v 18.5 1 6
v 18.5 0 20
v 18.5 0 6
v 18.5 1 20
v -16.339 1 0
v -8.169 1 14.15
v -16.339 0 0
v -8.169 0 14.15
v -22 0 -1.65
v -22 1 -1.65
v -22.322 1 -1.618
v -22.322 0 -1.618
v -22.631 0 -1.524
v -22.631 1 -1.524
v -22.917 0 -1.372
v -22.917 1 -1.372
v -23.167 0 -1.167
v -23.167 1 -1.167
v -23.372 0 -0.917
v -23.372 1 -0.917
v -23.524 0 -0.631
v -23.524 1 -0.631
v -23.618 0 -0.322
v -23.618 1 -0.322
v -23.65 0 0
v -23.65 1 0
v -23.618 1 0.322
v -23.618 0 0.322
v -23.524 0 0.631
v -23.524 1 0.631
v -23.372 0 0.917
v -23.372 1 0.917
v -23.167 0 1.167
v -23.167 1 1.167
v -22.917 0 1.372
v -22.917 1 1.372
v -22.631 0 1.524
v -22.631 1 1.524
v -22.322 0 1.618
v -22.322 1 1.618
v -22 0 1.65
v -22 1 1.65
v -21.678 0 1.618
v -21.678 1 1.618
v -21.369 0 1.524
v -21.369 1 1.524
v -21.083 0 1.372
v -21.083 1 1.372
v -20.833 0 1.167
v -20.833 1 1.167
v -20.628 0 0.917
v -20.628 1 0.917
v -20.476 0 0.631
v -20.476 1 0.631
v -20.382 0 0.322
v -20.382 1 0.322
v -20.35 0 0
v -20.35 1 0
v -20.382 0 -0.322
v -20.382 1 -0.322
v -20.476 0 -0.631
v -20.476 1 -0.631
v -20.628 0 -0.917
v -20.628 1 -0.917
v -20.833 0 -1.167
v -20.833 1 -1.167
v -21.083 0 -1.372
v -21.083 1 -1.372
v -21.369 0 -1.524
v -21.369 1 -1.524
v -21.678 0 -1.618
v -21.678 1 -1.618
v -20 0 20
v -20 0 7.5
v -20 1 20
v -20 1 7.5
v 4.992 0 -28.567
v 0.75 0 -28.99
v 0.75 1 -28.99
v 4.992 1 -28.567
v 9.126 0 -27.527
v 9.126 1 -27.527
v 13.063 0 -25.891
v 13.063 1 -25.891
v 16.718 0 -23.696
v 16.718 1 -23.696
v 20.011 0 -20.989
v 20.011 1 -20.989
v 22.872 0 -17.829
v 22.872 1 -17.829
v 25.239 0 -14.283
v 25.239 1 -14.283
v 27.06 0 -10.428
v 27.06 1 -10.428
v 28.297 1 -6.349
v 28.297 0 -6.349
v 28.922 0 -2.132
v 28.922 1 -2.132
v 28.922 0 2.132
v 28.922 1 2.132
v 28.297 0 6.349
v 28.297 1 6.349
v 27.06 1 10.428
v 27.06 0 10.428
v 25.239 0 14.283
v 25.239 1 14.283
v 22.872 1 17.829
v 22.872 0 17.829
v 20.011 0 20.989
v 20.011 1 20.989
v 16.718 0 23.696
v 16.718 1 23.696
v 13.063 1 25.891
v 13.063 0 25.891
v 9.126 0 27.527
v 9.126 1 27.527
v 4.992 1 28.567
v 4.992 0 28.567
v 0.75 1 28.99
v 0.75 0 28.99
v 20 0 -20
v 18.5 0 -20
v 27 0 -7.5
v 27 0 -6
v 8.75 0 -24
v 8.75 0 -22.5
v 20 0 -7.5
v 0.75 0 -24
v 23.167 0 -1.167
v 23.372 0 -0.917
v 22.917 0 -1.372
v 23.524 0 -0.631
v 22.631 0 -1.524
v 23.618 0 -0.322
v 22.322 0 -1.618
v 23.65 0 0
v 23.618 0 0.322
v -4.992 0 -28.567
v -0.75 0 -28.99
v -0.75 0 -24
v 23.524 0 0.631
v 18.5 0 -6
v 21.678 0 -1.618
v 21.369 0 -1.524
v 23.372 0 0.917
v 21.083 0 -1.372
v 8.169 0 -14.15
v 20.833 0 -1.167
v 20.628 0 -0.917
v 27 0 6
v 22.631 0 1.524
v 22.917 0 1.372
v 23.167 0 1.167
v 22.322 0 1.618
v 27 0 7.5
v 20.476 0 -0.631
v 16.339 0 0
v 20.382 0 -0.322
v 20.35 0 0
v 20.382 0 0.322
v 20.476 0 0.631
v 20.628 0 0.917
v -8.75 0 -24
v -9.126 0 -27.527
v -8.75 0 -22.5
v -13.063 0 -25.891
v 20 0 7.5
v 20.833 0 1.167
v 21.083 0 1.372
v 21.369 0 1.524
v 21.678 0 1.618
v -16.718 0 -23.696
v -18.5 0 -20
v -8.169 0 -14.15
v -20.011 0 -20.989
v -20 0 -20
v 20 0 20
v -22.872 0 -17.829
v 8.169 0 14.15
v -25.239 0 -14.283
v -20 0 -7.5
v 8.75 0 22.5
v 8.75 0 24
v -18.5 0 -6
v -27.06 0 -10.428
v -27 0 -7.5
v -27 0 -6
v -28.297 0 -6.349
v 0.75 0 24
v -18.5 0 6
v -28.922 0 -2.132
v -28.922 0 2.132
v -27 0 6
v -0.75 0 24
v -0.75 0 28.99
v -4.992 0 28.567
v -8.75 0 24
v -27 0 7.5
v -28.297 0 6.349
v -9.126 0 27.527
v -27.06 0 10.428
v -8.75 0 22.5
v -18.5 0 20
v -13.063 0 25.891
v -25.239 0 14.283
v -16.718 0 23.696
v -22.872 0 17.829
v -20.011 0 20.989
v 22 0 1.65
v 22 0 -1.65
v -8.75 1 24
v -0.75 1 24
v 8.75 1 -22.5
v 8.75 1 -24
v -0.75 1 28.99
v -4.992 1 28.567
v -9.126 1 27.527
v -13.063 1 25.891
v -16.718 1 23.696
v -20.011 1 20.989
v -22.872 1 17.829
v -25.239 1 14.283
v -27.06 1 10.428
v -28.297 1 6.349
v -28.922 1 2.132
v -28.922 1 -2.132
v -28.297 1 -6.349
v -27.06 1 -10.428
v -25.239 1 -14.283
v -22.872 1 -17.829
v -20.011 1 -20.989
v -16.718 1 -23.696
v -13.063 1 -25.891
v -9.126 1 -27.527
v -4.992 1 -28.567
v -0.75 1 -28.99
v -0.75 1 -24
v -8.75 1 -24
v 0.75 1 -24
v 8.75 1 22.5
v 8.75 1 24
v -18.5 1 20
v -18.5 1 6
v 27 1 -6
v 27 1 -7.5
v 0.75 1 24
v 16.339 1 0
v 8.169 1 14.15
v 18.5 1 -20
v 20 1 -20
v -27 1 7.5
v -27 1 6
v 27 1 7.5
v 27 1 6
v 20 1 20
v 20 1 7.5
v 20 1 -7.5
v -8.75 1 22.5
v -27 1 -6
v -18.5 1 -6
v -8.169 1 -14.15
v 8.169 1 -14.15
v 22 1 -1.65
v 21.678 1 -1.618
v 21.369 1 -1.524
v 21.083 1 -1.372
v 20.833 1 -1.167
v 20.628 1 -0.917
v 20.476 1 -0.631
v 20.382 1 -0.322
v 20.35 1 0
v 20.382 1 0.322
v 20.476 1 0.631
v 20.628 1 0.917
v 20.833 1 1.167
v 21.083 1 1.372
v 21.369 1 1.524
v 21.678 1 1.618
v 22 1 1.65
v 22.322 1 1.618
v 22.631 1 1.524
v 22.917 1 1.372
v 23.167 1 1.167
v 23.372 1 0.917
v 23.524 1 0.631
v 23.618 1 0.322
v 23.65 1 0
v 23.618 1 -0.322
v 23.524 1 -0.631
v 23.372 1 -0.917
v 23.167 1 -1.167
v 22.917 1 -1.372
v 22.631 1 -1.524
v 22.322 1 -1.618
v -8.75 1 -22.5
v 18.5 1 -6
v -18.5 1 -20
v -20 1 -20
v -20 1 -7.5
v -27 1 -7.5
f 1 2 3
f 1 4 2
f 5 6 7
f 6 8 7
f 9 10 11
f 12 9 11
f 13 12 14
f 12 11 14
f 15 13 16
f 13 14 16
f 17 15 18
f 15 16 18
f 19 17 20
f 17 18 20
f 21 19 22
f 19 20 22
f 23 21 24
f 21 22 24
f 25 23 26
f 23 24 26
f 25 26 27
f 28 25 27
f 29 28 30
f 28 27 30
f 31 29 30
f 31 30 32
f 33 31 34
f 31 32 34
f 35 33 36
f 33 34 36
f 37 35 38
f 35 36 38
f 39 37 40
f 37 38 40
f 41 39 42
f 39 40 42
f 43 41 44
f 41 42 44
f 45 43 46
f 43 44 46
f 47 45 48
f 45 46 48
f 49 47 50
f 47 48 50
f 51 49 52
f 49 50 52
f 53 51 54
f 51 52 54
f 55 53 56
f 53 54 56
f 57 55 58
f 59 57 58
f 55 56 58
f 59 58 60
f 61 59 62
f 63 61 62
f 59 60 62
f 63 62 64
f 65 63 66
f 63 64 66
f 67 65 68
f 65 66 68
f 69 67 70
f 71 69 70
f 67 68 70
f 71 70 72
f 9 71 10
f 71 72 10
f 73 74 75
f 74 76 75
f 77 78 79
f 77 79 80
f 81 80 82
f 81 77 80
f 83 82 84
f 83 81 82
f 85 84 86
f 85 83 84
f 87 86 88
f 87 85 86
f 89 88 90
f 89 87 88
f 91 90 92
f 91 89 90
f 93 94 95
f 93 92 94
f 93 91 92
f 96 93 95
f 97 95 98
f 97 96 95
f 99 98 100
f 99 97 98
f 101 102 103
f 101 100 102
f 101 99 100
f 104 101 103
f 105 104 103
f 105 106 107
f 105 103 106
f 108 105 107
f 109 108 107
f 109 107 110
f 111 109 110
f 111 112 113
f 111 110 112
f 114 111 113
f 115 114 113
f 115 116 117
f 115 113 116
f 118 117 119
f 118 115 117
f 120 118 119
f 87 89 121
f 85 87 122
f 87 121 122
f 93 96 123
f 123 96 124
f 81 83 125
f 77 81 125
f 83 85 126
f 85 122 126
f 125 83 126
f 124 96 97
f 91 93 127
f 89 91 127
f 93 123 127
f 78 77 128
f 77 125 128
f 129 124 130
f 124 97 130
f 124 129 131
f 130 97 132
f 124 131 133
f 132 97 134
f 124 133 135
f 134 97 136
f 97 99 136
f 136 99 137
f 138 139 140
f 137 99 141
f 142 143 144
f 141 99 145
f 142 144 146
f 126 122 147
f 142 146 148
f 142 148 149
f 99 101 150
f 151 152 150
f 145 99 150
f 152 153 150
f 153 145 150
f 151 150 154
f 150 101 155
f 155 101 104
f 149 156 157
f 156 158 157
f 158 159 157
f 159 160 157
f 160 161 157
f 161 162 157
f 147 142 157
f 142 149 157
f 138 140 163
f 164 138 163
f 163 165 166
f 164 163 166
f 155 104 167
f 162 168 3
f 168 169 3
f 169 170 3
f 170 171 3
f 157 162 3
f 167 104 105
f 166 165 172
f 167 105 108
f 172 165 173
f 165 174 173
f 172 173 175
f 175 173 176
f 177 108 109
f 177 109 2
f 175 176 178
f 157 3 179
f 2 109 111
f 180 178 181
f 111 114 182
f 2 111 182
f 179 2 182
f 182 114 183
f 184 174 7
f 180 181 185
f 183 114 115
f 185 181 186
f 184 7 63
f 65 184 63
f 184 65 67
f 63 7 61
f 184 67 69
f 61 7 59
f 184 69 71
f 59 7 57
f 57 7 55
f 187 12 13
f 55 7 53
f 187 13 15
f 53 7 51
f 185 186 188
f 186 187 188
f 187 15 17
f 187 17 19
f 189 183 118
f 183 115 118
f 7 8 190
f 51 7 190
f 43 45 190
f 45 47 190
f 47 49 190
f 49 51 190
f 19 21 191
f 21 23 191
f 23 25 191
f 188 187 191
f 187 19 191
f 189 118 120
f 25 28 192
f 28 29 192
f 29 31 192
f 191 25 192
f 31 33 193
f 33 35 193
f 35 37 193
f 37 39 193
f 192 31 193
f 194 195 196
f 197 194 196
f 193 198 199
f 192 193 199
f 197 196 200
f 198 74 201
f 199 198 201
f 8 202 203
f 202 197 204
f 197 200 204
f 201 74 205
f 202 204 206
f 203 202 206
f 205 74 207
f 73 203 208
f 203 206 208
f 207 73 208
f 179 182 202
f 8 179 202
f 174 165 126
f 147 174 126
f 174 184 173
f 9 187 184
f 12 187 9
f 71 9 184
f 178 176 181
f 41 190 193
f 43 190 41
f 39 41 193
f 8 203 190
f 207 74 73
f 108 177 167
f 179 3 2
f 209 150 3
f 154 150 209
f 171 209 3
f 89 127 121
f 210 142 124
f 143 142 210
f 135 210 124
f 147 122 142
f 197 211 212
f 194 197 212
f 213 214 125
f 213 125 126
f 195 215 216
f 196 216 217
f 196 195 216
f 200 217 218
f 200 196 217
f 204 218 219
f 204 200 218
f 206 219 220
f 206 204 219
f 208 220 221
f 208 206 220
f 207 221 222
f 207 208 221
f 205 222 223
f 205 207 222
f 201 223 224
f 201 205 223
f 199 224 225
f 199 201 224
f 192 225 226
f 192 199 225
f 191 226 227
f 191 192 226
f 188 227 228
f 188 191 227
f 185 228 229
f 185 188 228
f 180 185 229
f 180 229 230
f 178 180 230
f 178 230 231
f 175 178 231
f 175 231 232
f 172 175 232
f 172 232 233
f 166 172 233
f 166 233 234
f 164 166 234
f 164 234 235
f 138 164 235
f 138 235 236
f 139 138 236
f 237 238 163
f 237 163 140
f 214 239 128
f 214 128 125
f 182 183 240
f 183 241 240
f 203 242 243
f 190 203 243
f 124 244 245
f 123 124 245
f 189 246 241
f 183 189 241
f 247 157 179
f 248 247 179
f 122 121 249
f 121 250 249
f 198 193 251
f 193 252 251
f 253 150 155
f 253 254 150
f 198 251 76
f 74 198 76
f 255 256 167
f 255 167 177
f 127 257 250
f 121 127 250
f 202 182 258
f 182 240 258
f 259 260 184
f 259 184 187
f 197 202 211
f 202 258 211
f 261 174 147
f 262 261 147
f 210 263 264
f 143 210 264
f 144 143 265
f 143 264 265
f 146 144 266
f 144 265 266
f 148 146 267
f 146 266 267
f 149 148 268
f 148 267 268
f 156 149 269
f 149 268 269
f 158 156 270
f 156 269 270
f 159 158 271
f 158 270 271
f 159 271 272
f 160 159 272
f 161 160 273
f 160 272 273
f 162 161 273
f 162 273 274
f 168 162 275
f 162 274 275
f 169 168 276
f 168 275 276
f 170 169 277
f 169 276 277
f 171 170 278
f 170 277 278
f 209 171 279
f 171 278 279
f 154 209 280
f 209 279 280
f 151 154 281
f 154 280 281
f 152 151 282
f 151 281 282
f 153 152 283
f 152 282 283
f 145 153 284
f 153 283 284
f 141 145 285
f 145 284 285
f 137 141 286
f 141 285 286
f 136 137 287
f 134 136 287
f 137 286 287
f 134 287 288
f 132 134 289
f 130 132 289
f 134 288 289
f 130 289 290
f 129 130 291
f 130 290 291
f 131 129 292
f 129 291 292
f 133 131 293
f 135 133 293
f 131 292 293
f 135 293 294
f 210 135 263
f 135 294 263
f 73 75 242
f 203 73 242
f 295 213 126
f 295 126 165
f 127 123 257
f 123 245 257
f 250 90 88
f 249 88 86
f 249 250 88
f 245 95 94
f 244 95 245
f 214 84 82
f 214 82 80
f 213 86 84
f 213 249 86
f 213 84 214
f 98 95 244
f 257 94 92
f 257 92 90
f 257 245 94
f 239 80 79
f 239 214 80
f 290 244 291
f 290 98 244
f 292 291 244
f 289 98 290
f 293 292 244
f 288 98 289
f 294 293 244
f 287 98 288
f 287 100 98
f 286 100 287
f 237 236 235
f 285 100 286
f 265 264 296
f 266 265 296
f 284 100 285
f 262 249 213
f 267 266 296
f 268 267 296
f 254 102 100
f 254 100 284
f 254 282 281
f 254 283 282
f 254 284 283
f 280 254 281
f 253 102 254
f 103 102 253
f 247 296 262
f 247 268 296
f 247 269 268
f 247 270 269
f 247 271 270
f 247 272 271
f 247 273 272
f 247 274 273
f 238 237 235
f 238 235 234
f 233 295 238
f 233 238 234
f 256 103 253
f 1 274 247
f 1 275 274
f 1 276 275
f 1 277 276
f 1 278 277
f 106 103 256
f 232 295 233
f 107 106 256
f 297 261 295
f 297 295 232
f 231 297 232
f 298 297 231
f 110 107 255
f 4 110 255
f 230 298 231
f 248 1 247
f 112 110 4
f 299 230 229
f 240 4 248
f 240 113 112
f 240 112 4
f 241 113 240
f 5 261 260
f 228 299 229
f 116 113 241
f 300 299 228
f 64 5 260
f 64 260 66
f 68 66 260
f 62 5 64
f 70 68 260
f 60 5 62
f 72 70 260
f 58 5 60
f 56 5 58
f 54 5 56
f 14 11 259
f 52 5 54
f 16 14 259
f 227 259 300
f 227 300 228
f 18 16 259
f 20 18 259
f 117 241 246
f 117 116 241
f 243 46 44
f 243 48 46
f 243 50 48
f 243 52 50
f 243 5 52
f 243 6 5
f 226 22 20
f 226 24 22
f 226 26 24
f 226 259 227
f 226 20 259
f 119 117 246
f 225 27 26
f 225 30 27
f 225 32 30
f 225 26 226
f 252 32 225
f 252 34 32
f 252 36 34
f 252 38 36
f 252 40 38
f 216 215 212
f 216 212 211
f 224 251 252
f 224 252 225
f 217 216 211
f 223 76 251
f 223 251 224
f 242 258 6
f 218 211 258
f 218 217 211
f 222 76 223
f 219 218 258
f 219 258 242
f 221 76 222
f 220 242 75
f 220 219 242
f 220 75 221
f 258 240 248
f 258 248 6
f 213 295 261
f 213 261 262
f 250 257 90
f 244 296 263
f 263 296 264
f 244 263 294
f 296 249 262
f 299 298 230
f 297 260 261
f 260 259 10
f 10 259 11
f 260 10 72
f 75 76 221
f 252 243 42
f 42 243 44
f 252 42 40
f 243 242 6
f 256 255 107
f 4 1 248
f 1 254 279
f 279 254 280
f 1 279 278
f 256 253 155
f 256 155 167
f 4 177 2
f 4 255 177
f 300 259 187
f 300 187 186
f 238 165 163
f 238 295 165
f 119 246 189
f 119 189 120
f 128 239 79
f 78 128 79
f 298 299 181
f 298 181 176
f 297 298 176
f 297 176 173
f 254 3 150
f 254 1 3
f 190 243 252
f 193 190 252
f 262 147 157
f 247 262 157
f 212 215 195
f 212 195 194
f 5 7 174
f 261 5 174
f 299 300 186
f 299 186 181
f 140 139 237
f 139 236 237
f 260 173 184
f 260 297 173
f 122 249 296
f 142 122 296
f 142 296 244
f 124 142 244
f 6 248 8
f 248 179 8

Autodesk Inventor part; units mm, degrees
ref_plane "YZ Plane" through (0, 0, 0) normal (1, 0, 0) x (0, 1, 0)
ref_plane "XZ Plane" through (0, 0, 0) normal (0, 1, 0) x (-1, 0, 0)
ref_plane "XY Plane" through (0, 0, 0) normal (0, 0, 1) x (1, 0, 0)
sketch "Sketch1" plane through (0, 0, 0) normal (0, 1, 0) x (-1, 0, 0)
  circle A0 centre (0, 0) radius 29
  line L0 (-8.1695, -14.15) -> (-16.339, 0)
  line L1 (-16.339, 0) -> (-8.1695, 14.15)
  line L2 (-8.1695, 14.15) -> (8.1695, 14.15)
  line L3 (8.1695, 14.15) -> (16.339, 0)
  line L4 (16.339, 0) -> (8.1695, -14.15)
  line L5 (8.1695, -14.15) -> (-8.1695, -14.15)
  dimension "d0" = 58
  dimension "d1" = 28.3
extrude "Plate1" add sketch "Sketch1" along normal blind 1
sketch "Sketch2" plane through (0, 0, 0) normal (0, 1, 0) x (-1, 0, 0)
  point P0 (0, 0)
  point P1 (22, 0)
  point P2 (-22, 0)
  dimension "d3" = 22
  dimension "d4" = 22
hole "Hole1" at (-22, 0, 0) at (22, 0, 0) direction (0, 1, 0) diameter 3.3 end through all
sketch "Sketch3" plane through (0, 1, 0) normal (0, 1, 0) x (1, 0, 0)
  line L0 (0, 0) -> (8.5176, 0)
  line L1 (0, 0) -> (0, 7.5276)
  line L2 (-8.75, 24) -> (8.75, 24)
  line L3 (8.75, 24) -> (8.75, 22.5)
  line L4 (8.75, 22.5) -> (-8.75, 22.5)
  line L5 (-8.75, 22.5) -> (-8.75, 24)
  line L6 (0.75, 42.5) -> (-0.75, 42.5)
  line L7 (-0.75, 42.5) -> (-0.75, 22.5)
  line L8 (-0.75, 22.5) -> (0.75, 22.5)
  line L9 (0.75, 22.5) -> (0.75, 42.5)
  line L10 (-8.75, -24) -> (8.75, -24)
  line L11 (8.75, -24) -> (8.75, -22.5)
  line L12 (8.75, -22.5) -> (-8.75, -22.5)
  line L13 (-8.75, -22.5) -> (-8.75, -24)
  line L14 (0.75, -42.5) -> (-0.75, -42.5)
  line L15 (-0.75, -42.5) -> (-0.75, -22.5)
  line L16 (-0.75, -22.5) -> (0.75, -22.5)
  line L17 (0.75, -22.5) -> (0.75, -42.5)
  line L18 (-27, 7.5) -> (-18.5, 7.5)
  line L19 (-18.5, 7.5) -> (-18.5, 6)
  line L20 (-18.5, 6) -> (-27, 6)
  line L21 (-27, 6) -> (-27, 7.5)
  line L22 (-18.5, 6) -> (-20, 6)
  line L23 (-20, 6) -> (-20, 20)
  line L24 (-20, 20) -> (-18.5, 20)
  line L25 (-18.5, 20) -> (-18.5, 6)
  line L26 (27, 7.5) -> (18.5, 7.5)
  line L27 (18.5, 7.5) -> (18.5, 6)
  line L28 (18.5, 6) -> (27, 6)
  line L29 (27, 6) -> (27, 7.5)
  line L30 (18.5, 6) -> (20, 6)
  line L31 (20, 6) -> (20, 20)
  line L32 (20, 20) -> (18.5, 20)
  line L33 (18.5, 20) -> (18.5, 6)
  line L34 (-27, -7.5) -> (-18.5, -7.5)
  line L35 (-18.5, -7.5) -> (-18.5, -6)
  line L36 (-18.5, -6) -> (-27, -6)
  line L37 (-27, -6) -> (-27, -7.5)
  line L38 (-18.5, -6) -> (-20, -6)
  line L39 (-20, -6) -> (-20, -20)
  line L40 (-20, -20) -> (-18.5, -20)
  line L41 (-18.5, -20) -> (-18.5, -6)
  line L42 (18.5, -20) -> (18.5, -6)
  line L43 (20, -6) -> (20, -20)
  line L44 (20, -20) -> (18.5, -20)
  line L45 (18.5, -7.5) -> (18.5, -6)
  line L46 (18.5, -6) -> (20, -6)
  line L47 (27, -6) -> (27, -7.5)
  line L48 (27, -7.5) -> (18.5, -7.5)
  line L49 (18.5, -6) -> (27, -6)
  point P0 (0, 22.5)
  point P1 (0, -22.5)
  dimension "d12" = 1.5
  dimension "d13" = 1.5
  dimension "d14" = 22.5
  dimension "d15" = 17.5
  dimension "d16" = 20
  dimension "d17" = 1.5
  dimension "d18" = 1.5
  dimension "d19" = 8.5
  dimension "d20" = 14
  dimension "d21" = 6
  dimension "d22" = 18.5
extrude "Cut1" cut sketch "Sketch3" against normal blind 1
equation "\"d10\" = Thickness"
equation "\"d23\" = Thickness"
equation "\"BendRadius\" = Thickness"
equation "\"BendReliefWidth\" = Thickness"
equation "\"BendReliefDepth\" = 0.5 * Thickness"
equation "\"CornerReliefSize\" = 4 * Thickness"
equation "\"MinimumRemnant\" = 2 * Thickness"
equation "\"TransitionRadius\" = BendRadius"
equation "\"JacobiRadiusSize\" = BendRadius"
equation "\"GapSize\" = Thickness"
equation "\"d2\" = BendRadius"
equation "\"Thickness\" = 1"
properties part number "Luxcan centrador lente 38"
